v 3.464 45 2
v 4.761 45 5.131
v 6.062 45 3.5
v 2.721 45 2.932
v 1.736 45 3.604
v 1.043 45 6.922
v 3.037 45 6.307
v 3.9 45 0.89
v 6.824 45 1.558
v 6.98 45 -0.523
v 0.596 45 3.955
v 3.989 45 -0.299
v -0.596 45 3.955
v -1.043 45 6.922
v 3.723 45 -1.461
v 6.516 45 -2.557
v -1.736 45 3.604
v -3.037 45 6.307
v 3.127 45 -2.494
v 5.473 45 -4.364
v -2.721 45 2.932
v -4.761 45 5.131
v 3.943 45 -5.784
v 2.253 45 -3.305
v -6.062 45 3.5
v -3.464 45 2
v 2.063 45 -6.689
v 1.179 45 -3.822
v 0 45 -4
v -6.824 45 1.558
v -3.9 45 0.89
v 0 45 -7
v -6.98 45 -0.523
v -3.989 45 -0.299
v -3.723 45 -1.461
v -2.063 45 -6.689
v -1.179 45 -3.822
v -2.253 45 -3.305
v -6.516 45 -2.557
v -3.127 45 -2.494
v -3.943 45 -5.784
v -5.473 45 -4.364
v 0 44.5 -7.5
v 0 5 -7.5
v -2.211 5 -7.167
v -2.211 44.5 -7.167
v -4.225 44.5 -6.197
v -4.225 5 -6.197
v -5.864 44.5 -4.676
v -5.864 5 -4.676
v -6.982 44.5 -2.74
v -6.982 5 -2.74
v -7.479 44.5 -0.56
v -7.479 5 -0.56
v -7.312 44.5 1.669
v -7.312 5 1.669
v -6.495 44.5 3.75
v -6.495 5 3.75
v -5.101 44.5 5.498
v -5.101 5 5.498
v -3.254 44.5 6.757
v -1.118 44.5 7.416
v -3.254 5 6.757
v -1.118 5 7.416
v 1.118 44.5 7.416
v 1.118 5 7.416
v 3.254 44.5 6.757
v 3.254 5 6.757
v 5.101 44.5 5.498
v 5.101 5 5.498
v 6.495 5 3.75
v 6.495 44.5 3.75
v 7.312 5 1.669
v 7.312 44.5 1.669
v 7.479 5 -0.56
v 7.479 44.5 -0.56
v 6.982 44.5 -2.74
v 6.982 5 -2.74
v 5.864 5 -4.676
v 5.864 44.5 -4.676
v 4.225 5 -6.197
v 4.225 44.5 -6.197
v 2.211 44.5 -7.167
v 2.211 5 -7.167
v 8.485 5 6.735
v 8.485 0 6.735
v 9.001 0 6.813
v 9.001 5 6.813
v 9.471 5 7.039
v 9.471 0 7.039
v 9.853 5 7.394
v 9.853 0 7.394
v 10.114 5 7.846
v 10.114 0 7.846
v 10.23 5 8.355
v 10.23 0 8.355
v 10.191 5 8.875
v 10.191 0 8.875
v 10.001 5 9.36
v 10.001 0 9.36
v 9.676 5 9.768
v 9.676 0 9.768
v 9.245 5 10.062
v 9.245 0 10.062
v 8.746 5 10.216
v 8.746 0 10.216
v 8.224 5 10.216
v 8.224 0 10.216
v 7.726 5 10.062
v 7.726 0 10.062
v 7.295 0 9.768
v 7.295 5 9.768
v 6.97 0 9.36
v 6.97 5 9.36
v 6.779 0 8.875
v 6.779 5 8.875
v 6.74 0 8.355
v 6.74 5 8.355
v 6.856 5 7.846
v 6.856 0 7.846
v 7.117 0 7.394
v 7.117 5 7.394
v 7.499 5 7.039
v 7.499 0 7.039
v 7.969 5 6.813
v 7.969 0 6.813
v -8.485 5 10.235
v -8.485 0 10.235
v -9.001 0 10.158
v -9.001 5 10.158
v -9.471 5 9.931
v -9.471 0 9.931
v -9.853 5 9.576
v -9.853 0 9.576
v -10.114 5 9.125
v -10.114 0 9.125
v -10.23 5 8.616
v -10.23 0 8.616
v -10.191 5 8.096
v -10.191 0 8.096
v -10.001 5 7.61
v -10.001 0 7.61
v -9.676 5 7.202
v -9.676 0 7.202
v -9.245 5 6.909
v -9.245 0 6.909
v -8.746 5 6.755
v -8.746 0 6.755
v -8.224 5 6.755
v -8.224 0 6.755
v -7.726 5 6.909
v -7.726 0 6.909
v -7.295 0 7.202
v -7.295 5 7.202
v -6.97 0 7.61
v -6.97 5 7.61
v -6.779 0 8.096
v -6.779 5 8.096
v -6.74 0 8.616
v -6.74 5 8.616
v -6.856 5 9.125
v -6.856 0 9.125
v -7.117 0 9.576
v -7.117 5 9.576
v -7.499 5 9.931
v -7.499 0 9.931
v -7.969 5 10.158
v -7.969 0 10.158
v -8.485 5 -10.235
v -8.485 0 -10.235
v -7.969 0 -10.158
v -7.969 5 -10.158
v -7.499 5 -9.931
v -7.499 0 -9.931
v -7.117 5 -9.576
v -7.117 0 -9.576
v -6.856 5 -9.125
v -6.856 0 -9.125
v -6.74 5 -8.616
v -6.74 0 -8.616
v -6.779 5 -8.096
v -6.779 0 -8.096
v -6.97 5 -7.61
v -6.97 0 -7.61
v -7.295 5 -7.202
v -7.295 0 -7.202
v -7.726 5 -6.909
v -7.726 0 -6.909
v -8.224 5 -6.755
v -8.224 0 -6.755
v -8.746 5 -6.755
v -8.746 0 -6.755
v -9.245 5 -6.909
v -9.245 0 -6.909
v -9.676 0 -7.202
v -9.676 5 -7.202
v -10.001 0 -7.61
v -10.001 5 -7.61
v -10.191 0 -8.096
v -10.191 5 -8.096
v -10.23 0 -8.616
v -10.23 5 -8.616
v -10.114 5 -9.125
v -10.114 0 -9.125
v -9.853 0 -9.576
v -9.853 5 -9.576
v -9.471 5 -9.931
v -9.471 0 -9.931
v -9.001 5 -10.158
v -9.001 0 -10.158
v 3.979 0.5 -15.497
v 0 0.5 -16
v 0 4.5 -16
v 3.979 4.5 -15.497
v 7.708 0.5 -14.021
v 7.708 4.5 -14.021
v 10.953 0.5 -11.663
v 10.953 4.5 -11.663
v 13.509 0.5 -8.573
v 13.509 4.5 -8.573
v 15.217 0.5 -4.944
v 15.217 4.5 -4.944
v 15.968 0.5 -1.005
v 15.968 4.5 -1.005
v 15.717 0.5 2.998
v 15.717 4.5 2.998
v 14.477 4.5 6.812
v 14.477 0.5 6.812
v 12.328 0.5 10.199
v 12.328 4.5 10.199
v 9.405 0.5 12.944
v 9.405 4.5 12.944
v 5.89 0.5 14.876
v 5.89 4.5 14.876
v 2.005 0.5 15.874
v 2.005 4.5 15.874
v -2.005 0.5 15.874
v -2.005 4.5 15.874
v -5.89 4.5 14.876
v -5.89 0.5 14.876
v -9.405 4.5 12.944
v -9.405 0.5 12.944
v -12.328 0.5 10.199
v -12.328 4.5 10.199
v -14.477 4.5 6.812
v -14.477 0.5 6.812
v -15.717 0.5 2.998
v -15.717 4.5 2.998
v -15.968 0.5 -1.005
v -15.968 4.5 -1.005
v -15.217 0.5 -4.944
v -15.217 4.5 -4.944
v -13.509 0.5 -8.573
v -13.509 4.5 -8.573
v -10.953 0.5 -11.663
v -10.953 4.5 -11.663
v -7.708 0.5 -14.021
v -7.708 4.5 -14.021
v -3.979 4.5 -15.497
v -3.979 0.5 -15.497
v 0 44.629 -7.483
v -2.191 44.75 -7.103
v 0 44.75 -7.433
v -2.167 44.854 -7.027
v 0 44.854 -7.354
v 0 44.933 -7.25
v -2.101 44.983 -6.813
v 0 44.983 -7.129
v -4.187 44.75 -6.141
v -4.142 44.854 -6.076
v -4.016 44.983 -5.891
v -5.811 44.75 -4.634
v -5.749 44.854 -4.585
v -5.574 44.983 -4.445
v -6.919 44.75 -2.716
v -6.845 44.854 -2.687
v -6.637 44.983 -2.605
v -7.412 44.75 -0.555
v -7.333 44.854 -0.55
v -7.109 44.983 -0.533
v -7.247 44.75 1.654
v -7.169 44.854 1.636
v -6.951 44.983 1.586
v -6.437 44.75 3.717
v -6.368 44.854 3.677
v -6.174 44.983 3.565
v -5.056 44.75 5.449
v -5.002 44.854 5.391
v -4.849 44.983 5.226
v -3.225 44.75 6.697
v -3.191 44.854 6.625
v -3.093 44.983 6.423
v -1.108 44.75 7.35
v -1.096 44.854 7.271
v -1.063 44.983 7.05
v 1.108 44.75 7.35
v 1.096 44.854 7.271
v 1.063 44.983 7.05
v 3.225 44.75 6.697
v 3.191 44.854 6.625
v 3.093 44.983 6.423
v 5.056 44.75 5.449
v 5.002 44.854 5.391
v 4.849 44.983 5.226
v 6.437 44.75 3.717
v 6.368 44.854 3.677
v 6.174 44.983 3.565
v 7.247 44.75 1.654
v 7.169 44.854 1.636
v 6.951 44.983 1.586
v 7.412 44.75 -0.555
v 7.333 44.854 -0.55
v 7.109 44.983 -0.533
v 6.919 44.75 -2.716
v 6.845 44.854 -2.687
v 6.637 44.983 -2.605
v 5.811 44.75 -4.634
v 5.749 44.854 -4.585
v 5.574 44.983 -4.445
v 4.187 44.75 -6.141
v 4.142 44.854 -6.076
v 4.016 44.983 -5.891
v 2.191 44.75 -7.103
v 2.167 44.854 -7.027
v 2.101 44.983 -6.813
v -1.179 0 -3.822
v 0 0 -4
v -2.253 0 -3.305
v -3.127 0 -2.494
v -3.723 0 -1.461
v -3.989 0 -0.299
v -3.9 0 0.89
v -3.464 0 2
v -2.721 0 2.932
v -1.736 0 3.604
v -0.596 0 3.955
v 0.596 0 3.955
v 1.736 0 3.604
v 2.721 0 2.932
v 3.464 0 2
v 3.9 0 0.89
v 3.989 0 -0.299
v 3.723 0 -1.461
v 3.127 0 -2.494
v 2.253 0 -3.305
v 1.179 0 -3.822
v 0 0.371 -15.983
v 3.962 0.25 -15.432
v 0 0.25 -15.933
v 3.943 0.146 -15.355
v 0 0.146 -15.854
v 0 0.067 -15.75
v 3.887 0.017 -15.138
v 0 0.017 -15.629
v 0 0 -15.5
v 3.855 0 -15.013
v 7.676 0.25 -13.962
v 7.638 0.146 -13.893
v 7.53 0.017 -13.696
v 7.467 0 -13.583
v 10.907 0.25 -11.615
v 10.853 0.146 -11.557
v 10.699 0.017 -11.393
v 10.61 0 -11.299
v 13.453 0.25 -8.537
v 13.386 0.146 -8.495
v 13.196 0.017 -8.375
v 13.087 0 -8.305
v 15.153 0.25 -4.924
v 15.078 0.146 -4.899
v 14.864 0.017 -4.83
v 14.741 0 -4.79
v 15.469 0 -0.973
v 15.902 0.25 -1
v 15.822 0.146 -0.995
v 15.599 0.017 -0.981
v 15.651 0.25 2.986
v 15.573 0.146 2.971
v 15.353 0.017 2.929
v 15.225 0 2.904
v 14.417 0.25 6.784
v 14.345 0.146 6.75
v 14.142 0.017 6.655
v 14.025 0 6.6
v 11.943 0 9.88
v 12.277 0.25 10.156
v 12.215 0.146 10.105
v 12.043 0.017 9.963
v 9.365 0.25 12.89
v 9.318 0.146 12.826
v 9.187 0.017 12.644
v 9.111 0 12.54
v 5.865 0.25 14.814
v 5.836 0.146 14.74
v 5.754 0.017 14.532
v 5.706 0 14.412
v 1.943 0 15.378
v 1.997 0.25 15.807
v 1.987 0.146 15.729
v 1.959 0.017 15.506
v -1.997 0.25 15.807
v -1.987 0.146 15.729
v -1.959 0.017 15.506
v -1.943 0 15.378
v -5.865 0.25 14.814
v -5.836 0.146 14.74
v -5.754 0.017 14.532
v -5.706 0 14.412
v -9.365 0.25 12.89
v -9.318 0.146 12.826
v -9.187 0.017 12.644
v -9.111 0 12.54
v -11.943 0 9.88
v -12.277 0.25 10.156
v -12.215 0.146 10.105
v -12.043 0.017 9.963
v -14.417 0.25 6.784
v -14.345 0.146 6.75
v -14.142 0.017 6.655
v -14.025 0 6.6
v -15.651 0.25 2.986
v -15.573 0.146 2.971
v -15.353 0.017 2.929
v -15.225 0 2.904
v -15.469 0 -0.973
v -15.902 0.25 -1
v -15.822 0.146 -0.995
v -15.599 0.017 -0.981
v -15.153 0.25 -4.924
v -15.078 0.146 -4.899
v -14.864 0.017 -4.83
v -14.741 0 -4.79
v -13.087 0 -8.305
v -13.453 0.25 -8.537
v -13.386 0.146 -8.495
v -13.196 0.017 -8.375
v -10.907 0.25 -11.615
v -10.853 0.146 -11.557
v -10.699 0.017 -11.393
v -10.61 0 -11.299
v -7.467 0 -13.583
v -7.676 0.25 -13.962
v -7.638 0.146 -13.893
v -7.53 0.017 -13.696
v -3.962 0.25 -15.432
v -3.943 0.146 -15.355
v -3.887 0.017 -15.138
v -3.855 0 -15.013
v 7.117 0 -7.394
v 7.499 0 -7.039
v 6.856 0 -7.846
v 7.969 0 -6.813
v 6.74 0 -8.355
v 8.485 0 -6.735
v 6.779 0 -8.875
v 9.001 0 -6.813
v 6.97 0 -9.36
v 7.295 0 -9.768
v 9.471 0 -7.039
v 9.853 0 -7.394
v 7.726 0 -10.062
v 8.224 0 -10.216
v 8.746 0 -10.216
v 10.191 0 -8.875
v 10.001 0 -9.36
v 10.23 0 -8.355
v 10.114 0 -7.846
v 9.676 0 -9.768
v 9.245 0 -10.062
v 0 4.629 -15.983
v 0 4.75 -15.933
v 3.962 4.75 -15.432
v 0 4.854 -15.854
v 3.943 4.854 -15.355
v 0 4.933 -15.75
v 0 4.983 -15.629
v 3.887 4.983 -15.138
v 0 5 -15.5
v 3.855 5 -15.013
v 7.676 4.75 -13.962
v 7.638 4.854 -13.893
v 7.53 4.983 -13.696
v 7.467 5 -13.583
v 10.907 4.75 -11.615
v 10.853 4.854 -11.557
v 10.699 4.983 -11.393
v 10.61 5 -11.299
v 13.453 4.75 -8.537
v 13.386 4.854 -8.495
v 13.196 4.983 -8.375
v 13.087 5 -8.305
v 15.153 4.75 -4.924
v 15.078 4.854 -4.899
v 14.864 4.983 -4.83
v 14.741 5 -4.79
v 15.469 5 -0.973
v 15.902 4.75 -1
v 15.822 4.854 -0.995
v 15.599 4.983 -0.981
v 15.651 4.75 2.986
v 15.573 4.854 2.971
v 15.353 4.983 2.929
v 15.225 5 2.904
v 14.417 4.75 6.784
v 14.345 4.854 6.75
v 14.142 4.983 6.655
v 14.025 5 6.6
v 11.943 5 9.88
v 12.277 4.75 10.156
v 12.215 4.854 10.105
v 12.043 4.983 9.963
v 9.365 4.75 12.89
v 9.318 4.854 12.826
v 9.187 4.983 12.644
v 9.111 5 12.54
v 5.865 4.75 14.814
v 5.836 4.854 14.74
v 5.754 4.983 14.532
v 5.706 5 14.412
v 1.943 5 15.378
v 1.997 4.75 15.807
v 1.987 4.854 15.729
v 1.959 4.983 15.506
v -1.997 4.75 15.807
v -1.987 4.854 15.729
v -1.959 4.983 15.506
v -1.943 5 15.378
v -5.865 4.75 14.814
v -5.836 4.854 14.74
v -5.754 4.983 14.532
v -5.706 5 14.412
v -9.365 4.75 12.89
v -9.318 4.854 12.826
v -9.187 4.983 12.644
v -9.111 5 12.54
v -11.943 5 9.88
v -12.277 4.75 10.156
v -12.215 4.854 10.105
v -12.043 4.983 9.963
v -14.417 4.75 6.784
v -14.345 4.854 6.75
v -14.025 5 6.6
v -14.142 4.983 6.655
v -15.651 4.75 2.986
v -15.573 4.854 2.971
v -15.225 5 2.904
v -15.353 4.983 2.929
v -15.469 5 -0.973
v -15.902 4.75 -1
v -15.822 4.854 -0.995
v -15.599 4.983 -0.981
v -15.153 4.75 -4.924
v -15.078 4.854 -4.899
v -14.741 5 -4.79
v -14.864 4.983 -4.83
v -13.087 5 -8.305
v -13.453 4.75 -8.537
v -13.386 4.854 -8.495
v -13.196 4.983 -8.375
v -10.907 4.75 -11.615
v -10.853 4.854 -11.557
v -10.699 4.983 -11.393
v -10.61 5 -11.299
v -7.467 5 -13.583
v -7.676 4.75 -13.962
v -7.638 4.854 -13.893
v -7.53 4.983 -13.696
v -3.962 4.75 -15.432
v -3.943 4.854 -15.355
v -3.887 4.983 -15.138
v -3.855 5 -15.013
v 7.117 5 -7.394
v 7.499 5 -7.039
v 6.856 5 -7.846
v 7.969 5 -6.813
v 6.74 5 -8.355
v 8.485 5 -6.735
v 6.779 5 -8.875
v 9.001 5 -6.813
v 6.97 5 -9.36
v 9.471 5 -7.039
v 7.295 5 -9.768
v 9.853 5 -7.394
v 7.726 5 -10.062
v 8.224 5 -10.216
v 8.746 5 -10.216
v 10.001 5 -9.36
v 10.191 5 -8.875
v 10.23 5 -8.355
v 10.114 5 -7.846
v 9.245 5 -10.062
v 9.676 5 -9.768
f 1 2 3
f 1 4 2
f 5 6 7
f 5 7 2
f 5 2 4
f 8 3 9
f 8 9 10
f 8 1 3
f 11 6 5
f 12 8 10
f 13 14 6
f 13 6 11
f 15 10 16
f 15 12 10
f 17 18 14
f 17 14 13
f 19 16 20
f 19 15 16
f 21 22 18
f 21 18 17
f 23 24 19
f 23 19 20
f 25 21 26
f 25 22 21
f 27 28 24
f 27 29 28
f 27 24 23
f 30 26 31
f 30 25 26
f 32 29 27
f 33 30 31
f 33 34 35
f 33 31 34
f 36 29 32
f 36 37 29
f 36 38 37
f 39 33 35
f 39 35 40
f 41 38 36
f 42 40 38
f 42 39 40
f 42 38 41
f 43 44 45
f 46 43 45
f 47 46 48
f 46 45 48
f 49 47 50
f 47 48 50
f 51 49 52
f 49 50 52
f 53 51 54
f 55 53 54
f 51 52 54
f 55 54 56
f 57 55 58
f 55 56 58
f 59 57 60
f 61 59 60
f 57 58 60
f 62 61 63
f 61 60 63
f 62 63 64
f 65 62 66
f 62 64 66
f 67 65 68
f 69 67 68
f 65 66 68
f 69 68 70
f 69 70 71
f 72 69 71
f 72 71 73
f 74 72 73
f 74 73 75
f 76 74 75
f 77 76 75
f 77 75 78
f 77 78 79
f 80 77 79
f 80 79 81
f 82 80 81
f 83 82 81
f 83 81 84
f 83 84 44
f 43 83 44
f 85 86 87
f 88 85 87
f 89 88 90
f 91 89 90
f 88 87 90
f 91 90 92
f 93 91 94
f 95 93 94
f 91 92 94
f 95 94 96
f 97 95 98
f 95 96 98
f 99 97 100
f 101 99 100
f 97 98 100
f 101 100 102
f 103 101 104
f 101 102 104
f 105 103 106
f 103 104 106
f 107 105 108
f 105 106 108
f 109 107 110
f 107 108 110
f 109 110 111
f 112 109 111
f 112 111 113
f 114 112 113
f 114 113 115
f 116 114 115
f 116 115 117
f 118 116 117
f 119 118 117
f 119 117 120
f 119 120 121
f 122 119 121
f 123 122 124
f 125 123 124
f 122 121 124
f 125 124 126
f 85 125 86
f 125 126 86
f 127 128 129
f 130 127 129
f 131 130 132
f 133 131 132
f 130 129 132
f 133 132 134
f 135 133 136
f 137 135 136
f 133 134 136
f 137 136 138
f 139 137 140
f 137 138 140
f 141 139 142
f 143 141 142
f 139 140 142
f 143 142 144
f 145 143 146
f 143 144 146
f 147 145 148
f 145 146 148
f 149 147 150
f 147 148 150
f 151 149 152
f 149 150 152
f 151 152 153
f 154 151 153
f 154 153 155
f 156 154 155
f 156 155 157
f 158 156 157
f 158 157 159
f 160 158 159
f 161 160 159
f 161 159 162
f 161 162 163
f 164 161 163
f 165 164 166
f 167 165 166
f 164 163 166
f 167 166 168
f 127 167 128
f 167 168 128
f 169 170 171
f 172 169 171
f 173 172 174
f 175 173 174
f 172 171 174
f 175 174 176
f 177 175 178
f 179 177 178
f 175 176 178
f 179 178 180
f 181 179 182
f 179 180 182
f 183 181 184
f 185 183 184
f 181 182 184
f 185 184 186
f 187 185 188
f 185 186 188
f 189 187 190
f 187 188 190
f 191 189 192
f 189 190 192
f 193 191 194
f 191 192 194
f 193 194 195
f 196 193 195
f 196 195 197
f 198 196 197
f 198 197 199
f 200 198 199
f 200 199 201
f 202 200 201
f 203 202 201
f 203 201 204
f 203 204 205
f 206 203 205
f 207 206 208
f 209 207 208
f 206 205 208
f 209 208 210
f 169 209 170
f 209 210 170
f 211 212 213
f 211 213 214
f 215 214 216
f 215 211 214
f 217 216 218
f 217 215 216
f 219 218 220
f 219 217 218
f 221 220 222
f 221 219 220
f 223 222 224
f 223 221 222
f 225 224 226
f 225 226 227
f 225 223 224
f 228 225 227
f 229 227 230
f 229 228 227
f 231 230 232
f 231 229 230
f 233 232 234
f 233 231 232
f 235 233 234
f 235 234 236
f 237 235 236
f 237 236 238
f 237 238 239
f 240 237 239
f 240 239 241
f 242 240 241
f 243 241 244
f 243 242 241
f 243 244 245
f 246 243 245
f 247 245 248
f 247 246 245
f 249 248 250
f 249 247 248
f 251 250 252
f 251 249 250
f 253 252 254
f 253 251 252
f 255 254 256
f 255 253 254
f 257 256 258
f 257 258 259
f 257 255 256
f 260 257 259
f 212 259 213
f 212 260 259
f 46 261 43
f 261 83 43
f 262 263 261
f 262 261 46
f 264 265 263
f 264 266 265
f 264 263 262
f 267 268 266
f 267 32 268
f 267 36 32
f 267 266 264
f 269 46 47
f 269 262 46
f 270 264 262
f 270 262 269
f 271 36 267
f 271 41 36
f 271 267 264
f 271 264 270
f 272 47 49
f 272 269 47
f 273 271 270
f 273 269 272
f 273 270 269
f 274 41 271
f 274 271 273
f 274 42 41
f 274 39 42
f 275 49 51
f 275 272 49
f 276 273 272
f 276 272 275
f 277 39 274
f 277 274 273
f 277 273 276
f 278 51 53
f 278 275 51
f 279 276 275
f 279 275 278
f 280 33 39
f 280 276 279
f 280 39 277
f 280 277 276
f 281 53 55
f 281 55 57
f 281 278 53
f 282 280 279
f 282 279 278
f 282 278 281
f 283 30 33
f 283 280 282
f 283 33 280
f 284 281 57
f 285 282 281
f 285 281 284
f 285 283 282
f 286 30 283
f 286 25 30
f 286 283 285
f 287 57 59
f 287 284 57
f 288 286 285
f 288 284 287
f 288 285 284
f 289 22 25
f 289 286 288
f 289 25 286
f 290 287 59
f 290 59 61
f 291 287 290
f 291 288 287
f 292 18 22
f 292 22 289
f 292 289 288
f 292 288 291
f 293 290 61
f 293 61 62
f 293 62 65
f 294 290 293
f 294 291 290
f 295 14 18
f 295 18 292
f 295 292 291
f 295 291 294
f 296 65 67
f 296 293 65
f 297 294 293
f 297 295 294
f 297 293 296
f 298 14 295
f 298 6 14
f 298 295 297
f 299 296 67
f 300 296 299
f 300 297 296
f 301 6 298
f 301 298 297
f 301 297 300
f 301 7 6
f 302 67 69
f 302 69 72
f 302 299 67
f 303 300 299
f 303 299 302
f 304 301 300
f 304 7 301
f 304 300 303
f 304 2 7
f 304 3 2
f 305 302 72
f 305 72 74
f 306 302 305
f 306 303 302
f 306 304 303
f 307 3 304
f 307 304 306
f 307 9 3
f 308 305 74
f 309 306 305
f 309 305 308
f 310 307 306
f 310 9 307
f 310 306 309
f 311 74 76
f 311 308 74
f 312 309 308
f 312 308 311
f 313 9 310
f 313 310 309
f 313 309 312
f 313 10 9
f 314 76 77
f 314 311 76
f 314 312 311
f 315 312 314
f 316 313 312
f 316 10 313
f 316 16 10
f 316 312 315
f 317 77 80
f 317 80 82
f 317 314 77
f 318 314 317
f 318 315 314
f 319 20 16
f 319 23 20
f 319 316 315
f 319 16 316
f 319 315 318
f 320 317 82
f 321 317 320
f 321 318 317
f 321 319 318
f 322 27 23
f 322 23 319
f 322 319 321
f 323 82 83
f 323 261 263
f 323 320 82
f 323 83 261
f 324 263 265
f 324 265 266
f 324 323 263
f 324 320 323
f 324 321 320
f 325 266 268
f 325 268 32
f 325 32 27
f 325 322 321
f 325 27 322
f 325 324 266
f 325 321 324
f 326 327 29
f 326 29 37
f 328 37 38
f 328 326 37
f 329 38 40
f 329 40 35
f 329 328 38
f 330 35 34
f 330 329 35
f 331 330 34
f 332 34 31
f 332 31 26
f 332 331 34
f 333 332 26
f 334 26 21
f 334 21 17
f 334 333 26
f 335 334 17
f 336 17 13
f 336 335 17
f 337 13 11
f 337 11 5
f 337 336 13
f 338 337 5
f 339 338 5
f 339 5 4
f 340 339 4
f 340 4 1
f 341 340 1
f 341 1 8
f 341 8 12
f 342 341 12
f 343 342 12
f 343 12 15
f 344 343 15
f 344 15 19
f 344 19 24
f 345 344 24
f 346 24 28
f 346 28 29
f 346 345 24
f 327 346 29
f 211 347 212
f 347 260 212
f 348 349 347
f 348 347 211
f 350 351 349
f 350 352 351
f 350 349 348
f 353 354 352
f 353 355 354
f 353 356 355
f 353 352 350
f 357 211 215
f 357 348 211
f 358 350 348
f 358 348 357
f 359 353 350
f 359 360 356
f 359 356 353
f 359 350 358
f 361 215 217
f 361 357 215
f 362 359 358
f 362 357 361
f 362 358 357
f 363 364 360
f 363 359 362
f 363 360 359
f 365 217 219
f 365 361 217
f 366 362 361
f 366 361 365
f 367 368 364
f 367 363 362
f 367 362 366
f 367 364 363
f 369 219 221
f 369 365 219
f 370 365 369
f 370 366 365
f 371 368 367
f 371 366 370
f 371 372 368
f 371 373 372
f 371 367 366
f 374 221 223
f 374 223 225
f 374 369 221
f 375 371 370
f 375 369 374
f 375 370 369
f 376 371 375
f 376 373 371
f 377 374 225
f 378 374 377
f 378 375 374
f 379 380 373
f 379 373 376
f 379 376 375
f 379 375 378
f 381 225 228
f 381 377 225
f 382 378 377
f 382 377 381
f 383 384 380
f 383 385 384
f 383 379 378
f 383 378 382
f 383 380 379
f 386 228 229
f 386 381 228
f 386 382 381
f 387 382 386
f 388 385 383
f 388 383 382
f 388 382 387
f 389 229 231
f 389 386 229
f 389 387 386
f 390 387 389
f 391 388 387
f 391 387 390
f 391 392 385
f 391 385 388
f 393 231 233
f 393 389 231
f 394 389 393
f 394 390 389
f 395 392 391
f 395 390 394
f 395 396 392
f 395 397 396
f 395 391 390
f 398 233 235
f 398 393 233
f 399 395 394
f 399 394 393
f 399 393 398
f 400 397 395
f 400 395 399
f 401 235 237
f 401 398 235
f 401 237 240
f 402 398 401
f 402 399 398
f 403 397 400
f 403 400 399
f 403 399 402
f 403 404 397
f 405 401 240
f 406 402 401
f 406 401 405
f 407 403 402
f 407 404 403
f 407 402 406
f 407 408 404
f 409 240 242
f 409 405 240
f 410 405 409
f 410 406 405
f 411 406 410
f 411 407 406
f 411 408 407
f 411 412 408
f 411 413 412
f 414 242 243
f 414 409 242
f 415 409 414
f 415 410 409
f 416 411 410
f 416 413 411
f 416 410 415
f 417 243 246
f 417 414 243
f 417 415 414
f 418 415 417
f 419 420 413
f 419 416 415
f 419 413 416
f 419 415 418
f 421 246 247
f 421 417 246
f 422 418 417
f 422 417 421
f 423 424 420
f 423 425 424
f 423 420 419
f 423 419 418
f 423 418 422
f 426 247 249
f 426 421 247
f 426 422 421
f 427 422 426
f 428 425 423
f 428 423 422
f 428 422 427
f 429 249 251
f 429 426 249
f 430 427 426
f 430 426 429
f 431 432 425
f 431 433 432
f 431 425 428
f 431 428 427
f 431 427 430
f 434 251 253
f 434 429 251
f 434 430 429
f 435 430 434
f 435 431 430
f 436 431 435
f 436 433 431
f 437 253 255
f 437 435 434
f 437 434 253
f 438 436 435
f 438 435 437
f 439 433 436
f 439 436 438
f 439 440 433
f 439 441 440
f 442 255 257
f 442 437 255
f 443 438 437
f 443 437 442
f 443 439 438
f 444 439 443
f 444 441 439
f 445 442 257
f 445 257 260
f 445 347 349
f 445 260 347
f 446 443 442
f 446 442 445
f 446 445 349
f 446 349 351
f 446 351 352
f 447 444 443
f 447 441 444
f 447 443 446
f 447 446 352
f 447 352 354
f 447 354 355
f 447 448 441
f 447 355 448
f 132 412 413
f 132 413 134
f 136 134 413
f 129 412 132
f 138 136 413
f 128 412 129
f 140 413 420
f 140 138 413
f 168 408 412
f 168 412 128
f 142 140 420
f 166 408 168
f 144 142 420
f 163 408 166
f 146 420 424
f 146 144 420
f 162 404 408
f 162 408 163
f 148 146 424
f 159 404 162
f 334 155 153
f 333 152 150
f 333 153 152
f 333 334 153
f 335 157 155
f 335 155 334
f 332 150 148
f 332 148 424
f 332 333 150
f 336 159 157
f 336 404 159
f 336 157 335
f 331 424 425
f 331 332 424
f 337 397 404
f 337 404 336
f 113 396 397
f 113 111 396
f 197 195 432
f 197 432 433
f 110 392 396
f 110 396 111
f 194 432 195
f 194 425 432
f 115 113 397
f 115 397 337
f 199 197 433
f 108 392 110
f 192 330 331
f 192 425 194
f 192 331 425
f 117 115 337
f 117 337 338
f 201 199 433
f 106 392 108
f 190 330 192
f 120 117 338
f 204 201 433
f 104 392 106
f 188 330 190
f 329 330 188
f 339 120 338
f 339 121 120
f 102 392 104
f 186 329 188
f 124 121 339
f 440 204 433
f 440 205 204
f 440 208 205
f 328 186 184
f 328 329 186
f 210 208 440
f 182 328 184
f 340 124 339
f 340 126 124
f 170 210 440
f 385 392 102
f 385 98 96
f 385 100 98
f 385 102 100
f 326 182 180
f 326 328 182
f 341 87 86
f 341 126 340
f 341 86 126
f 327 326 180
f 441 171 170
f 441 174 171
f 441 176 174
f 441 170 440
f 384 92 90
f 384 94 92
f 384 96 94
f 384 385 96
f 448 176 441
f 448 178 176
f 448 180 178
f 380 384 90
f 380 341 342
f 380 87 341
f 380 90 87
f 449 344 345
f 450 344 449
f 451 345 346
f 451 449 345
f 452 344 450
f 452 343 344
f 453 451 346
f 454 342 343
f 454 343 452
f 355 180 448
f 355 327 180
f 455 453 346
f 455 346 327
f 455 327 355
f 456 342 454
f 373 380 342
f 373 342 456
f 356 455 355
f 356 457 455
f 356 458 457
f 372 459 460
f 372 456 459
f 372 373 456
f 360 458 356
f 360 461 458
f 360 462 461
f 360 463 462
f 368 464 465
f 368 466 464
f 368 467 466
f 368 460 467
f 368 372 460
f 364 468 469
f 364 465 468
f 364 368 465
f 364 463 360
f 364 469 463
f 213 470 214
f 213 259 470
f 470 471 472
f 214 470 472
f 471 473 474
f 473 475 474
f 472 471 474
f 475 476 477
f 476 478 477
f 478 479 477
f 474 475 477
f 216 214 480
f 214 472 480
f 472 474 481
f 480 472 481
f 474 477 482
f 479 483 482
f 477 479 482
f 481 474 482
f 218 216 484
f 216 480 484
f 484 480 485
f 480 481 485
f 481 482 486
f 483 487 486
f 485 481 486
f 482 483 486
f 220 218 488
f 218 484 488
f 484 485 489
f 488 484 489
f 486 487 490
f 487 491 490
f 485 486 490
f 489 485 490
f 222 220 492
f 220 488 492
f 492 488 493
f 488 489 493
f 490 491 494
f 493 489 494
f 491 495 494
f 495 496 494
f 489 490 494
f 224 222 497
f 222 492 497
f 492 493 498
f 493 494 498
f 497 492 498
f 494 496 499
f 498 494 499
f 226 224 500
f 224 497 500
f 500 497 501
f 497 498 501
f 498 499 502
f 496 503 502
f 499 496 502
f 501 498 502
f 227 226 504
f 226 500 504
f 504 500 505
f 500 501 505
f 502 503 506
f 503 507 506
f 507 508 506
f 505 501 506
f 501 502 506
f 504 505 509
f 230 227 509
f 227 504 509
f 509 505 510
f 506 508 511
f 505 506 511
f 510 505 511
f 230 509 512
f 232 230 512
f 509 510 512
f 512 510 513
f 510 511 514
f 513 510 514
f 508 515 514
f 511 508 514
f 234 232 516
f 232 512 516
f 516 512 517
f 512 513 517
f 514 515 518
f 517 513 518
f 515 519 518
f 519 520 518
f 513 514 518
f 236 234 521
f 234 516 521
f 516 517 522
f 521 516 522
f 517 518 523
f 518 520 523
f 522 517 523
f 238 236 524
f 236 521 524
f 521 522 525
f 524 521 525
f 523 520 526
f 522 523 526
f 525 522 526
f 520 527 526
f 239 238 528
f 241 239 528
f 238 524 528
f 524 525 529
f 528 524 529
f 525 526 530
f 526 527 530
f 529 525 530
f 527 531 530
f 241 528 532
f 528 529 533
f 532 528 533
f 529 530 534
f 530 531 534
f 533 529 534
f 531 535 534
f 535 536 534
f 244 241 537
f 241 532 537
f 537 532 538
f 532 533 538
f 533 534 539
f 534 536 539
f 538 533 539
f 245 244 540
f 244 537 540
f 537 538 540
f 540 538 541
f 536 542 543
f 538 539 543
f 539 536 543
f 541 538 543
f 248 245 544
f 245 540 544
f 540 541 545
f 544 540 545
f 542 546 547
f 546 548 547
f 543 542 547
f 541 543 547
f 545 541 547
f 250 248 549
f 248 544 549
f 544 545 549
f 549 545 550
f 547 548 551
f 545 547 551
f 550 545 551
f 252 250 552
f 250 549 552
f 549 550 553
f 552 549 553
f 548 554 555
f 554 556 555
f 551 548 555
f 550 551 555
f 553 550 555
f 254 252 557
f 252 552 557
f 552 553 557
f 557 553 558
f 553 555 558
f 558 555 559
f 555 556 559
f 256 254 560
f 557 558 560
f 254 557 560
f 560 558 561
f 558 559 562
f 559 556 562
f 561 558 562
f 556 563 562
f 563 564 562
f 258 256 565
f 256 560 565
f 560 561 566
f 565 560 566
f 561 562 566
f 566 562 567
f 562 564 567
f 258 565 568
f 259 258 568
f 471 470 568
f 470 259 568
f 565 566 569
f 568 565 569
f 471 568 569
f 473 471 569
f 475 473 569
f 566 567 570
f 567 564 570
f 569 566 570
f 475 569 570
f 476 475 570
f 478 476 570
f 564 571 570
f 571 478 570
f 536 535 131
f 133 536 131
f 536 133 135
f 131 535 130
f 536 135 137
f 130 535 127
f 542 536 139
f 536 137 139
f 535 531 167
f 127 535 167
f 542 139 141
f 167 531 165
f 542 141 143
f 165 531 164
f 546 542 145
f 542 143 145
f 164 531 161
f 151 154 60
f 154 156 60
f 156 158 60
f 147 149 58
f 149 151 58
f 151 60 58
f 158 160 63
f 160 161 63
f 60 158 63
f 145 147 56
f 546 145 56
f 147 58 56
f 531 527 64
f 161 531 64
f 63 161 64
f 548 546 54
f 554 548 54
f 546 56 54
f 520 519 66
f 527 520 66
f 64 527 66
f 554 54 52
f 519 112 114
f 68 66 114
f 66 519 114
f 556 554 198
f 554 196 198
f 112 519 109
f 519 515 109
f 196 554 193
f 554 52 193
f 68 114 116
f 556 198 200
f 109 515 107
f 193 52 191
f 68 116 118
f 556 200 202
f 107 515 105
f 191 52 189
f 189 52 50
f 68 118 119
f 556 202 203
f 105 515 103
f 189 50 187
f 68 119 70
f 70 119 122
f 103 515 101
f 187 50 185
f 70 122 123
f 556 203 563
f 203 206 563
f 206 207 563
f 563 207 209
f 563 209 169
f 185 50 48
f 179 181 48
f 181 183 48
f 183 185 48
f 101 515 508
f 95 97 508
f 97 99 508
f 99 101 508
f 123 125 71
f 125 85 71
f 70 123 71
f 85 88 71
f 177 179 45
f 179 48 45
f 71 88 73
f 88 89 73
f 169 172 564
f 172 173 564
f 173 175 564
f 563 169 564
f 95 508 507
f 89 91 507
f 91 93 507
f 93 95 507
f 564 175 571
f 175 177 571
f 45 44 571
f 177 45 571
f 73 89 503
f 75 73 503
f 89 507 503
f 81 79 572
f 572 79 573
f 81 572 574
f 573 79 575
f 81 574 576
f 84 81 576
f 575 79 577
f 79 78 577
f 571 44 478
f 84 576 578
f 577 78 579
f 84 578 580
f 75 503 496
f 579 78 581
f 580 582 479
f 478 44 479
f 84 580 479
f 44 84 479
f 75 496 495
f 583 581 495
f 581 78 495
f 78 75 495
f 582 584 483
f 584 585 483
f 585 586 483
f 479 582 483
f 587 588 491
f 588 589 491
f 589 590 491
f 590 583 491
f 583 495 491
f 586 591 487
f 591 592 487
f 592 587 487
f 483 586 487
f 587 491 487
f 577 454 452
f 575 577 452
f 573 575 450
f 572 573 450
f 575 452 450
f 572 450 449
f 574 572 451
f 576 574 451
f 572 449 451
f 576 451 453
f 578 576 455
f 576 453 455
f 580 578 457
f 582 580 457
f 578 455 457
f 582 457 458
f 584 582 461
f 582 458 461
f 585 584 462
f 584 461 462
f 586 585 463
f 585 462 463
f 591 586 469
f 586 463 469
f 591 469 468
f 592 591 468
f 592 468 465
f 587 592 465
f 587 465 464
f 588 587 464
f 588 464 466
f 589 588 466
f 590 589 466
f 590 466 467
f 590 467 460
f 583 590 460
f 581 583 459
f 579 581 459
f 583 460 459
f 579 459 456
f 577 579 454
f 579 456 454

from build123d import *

# Parameters (mm, degrees)
SKETCH1_R           = 7.5
SKETCH1_R_2         = 4
BOSS_EXTRUDE1_DEPTH = 45
SKETCH2_R           = 16
SKETCH2_R_2         = 1.75
SKETCH2_R_3         = 7.5
BOSS_EXTRUDE2_DEPTH = 5
FILLET2_R           = 0.5


with BuildPart() as part:
    # Sketch1 → Boss-Extrude1 (new body)
    with BuildSketch(Plane(origin=(0, 0, 0), x_dir=(1, 0, 0), z_dir=(0, 1, 0))):
        with Locations(Location((0, 0, 0), (0, 0, 90))):
            Circle(SKETCH1_R)
        with Locations(Location((0, 0, 0), (0, 0, 90))):
            Circle(SKETCH1_R_2, mode=Mode.SUBTRACT)
    extrude(amount=BOSS_EXTRUDE1_DEPTH)

    # Sketch2 → Boss-Extrude2 (add)
    with BuildSketch(Plane.XZ):
        with Locations(Location((0, 0, 0), (0, 0, 270))):
            Circle(SKETCH2_R)
        with Locations(Location((8.485281374, 8.485281374, 0), (0, 0, 270))):
            Circle(SKETCH2_R_2, mode=Mode.SUBTRACT)
        with Locations(Location((0, 0, 0), (0, 0, 270))):
            Circle(SKETCH2_R_3, mode=Mode.SUBTRACT)
        with Locations(Location((-8.485281374, 8.485281374, 0), (0, 0, 90))):
            Circle(SKETCH2_R_2, mode=Mode.SUBTRACT)
        with Locations(Location((-8.485281374, -8.485281374, 0), (0, 0, 270))):
            Circle(SKETCH2_R_2, mode=Mode.SUBTRACT)
        with Locations(Location((8.485281374, -8.485281374, 0), (0, 0, 90))):
            Circle(SKETCH2_R_2, mode=Mode.SUBTRACT)
    extrude(amount=-BOSS_EXTRUDE2_DEPTH)

    # Fillet2
    fillet2_edges = [part.edges().sort_by_distance(p)[0] for p in [
        (0, 5, 16),
        (0, 0, 16),
        (0, 45, 7.5),
    ]]
    fillet(fillet2_edges, radius=FILLET2_R)


solid = part.part
